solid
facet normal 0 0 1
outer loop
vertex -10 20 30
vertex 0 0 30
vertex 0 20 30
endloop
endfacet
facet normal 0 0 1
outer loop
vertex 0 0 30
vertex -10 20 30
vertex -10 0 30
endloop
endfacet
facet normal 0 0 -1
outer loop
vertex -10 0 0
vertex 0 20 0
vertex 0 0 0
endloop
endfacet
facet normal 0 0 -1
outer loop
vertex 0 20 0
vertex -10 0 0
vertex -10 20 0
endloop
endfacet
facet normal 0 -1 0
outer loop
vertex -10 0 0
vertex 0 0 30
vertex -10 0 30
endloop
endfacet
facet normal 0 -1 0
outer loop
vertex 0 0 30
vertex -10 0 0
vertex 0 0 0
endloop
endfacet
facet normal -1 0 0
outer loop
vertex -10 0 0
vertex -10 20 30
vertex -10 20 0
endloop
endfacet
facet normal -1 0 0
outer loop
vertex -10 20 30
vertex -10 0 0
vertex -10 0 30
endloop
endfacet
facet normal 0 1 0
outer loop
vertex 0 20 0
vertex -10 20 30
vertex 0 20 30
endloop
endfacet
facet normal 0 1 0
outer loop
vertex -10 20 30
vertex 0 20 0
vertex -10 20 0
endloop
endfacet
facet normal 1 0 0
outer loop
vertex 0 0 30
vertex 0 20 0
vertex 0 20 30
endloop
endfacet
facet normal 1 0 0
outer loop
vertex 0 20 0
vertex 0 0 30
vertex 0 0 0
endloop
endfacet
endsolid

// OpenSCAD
// Generated by scadwright. Do not hand-edit —
// edit the Python source and regenerate.

mirror([1, 0, 0]) {
    cube([10, 20, 30], center=false);
}
